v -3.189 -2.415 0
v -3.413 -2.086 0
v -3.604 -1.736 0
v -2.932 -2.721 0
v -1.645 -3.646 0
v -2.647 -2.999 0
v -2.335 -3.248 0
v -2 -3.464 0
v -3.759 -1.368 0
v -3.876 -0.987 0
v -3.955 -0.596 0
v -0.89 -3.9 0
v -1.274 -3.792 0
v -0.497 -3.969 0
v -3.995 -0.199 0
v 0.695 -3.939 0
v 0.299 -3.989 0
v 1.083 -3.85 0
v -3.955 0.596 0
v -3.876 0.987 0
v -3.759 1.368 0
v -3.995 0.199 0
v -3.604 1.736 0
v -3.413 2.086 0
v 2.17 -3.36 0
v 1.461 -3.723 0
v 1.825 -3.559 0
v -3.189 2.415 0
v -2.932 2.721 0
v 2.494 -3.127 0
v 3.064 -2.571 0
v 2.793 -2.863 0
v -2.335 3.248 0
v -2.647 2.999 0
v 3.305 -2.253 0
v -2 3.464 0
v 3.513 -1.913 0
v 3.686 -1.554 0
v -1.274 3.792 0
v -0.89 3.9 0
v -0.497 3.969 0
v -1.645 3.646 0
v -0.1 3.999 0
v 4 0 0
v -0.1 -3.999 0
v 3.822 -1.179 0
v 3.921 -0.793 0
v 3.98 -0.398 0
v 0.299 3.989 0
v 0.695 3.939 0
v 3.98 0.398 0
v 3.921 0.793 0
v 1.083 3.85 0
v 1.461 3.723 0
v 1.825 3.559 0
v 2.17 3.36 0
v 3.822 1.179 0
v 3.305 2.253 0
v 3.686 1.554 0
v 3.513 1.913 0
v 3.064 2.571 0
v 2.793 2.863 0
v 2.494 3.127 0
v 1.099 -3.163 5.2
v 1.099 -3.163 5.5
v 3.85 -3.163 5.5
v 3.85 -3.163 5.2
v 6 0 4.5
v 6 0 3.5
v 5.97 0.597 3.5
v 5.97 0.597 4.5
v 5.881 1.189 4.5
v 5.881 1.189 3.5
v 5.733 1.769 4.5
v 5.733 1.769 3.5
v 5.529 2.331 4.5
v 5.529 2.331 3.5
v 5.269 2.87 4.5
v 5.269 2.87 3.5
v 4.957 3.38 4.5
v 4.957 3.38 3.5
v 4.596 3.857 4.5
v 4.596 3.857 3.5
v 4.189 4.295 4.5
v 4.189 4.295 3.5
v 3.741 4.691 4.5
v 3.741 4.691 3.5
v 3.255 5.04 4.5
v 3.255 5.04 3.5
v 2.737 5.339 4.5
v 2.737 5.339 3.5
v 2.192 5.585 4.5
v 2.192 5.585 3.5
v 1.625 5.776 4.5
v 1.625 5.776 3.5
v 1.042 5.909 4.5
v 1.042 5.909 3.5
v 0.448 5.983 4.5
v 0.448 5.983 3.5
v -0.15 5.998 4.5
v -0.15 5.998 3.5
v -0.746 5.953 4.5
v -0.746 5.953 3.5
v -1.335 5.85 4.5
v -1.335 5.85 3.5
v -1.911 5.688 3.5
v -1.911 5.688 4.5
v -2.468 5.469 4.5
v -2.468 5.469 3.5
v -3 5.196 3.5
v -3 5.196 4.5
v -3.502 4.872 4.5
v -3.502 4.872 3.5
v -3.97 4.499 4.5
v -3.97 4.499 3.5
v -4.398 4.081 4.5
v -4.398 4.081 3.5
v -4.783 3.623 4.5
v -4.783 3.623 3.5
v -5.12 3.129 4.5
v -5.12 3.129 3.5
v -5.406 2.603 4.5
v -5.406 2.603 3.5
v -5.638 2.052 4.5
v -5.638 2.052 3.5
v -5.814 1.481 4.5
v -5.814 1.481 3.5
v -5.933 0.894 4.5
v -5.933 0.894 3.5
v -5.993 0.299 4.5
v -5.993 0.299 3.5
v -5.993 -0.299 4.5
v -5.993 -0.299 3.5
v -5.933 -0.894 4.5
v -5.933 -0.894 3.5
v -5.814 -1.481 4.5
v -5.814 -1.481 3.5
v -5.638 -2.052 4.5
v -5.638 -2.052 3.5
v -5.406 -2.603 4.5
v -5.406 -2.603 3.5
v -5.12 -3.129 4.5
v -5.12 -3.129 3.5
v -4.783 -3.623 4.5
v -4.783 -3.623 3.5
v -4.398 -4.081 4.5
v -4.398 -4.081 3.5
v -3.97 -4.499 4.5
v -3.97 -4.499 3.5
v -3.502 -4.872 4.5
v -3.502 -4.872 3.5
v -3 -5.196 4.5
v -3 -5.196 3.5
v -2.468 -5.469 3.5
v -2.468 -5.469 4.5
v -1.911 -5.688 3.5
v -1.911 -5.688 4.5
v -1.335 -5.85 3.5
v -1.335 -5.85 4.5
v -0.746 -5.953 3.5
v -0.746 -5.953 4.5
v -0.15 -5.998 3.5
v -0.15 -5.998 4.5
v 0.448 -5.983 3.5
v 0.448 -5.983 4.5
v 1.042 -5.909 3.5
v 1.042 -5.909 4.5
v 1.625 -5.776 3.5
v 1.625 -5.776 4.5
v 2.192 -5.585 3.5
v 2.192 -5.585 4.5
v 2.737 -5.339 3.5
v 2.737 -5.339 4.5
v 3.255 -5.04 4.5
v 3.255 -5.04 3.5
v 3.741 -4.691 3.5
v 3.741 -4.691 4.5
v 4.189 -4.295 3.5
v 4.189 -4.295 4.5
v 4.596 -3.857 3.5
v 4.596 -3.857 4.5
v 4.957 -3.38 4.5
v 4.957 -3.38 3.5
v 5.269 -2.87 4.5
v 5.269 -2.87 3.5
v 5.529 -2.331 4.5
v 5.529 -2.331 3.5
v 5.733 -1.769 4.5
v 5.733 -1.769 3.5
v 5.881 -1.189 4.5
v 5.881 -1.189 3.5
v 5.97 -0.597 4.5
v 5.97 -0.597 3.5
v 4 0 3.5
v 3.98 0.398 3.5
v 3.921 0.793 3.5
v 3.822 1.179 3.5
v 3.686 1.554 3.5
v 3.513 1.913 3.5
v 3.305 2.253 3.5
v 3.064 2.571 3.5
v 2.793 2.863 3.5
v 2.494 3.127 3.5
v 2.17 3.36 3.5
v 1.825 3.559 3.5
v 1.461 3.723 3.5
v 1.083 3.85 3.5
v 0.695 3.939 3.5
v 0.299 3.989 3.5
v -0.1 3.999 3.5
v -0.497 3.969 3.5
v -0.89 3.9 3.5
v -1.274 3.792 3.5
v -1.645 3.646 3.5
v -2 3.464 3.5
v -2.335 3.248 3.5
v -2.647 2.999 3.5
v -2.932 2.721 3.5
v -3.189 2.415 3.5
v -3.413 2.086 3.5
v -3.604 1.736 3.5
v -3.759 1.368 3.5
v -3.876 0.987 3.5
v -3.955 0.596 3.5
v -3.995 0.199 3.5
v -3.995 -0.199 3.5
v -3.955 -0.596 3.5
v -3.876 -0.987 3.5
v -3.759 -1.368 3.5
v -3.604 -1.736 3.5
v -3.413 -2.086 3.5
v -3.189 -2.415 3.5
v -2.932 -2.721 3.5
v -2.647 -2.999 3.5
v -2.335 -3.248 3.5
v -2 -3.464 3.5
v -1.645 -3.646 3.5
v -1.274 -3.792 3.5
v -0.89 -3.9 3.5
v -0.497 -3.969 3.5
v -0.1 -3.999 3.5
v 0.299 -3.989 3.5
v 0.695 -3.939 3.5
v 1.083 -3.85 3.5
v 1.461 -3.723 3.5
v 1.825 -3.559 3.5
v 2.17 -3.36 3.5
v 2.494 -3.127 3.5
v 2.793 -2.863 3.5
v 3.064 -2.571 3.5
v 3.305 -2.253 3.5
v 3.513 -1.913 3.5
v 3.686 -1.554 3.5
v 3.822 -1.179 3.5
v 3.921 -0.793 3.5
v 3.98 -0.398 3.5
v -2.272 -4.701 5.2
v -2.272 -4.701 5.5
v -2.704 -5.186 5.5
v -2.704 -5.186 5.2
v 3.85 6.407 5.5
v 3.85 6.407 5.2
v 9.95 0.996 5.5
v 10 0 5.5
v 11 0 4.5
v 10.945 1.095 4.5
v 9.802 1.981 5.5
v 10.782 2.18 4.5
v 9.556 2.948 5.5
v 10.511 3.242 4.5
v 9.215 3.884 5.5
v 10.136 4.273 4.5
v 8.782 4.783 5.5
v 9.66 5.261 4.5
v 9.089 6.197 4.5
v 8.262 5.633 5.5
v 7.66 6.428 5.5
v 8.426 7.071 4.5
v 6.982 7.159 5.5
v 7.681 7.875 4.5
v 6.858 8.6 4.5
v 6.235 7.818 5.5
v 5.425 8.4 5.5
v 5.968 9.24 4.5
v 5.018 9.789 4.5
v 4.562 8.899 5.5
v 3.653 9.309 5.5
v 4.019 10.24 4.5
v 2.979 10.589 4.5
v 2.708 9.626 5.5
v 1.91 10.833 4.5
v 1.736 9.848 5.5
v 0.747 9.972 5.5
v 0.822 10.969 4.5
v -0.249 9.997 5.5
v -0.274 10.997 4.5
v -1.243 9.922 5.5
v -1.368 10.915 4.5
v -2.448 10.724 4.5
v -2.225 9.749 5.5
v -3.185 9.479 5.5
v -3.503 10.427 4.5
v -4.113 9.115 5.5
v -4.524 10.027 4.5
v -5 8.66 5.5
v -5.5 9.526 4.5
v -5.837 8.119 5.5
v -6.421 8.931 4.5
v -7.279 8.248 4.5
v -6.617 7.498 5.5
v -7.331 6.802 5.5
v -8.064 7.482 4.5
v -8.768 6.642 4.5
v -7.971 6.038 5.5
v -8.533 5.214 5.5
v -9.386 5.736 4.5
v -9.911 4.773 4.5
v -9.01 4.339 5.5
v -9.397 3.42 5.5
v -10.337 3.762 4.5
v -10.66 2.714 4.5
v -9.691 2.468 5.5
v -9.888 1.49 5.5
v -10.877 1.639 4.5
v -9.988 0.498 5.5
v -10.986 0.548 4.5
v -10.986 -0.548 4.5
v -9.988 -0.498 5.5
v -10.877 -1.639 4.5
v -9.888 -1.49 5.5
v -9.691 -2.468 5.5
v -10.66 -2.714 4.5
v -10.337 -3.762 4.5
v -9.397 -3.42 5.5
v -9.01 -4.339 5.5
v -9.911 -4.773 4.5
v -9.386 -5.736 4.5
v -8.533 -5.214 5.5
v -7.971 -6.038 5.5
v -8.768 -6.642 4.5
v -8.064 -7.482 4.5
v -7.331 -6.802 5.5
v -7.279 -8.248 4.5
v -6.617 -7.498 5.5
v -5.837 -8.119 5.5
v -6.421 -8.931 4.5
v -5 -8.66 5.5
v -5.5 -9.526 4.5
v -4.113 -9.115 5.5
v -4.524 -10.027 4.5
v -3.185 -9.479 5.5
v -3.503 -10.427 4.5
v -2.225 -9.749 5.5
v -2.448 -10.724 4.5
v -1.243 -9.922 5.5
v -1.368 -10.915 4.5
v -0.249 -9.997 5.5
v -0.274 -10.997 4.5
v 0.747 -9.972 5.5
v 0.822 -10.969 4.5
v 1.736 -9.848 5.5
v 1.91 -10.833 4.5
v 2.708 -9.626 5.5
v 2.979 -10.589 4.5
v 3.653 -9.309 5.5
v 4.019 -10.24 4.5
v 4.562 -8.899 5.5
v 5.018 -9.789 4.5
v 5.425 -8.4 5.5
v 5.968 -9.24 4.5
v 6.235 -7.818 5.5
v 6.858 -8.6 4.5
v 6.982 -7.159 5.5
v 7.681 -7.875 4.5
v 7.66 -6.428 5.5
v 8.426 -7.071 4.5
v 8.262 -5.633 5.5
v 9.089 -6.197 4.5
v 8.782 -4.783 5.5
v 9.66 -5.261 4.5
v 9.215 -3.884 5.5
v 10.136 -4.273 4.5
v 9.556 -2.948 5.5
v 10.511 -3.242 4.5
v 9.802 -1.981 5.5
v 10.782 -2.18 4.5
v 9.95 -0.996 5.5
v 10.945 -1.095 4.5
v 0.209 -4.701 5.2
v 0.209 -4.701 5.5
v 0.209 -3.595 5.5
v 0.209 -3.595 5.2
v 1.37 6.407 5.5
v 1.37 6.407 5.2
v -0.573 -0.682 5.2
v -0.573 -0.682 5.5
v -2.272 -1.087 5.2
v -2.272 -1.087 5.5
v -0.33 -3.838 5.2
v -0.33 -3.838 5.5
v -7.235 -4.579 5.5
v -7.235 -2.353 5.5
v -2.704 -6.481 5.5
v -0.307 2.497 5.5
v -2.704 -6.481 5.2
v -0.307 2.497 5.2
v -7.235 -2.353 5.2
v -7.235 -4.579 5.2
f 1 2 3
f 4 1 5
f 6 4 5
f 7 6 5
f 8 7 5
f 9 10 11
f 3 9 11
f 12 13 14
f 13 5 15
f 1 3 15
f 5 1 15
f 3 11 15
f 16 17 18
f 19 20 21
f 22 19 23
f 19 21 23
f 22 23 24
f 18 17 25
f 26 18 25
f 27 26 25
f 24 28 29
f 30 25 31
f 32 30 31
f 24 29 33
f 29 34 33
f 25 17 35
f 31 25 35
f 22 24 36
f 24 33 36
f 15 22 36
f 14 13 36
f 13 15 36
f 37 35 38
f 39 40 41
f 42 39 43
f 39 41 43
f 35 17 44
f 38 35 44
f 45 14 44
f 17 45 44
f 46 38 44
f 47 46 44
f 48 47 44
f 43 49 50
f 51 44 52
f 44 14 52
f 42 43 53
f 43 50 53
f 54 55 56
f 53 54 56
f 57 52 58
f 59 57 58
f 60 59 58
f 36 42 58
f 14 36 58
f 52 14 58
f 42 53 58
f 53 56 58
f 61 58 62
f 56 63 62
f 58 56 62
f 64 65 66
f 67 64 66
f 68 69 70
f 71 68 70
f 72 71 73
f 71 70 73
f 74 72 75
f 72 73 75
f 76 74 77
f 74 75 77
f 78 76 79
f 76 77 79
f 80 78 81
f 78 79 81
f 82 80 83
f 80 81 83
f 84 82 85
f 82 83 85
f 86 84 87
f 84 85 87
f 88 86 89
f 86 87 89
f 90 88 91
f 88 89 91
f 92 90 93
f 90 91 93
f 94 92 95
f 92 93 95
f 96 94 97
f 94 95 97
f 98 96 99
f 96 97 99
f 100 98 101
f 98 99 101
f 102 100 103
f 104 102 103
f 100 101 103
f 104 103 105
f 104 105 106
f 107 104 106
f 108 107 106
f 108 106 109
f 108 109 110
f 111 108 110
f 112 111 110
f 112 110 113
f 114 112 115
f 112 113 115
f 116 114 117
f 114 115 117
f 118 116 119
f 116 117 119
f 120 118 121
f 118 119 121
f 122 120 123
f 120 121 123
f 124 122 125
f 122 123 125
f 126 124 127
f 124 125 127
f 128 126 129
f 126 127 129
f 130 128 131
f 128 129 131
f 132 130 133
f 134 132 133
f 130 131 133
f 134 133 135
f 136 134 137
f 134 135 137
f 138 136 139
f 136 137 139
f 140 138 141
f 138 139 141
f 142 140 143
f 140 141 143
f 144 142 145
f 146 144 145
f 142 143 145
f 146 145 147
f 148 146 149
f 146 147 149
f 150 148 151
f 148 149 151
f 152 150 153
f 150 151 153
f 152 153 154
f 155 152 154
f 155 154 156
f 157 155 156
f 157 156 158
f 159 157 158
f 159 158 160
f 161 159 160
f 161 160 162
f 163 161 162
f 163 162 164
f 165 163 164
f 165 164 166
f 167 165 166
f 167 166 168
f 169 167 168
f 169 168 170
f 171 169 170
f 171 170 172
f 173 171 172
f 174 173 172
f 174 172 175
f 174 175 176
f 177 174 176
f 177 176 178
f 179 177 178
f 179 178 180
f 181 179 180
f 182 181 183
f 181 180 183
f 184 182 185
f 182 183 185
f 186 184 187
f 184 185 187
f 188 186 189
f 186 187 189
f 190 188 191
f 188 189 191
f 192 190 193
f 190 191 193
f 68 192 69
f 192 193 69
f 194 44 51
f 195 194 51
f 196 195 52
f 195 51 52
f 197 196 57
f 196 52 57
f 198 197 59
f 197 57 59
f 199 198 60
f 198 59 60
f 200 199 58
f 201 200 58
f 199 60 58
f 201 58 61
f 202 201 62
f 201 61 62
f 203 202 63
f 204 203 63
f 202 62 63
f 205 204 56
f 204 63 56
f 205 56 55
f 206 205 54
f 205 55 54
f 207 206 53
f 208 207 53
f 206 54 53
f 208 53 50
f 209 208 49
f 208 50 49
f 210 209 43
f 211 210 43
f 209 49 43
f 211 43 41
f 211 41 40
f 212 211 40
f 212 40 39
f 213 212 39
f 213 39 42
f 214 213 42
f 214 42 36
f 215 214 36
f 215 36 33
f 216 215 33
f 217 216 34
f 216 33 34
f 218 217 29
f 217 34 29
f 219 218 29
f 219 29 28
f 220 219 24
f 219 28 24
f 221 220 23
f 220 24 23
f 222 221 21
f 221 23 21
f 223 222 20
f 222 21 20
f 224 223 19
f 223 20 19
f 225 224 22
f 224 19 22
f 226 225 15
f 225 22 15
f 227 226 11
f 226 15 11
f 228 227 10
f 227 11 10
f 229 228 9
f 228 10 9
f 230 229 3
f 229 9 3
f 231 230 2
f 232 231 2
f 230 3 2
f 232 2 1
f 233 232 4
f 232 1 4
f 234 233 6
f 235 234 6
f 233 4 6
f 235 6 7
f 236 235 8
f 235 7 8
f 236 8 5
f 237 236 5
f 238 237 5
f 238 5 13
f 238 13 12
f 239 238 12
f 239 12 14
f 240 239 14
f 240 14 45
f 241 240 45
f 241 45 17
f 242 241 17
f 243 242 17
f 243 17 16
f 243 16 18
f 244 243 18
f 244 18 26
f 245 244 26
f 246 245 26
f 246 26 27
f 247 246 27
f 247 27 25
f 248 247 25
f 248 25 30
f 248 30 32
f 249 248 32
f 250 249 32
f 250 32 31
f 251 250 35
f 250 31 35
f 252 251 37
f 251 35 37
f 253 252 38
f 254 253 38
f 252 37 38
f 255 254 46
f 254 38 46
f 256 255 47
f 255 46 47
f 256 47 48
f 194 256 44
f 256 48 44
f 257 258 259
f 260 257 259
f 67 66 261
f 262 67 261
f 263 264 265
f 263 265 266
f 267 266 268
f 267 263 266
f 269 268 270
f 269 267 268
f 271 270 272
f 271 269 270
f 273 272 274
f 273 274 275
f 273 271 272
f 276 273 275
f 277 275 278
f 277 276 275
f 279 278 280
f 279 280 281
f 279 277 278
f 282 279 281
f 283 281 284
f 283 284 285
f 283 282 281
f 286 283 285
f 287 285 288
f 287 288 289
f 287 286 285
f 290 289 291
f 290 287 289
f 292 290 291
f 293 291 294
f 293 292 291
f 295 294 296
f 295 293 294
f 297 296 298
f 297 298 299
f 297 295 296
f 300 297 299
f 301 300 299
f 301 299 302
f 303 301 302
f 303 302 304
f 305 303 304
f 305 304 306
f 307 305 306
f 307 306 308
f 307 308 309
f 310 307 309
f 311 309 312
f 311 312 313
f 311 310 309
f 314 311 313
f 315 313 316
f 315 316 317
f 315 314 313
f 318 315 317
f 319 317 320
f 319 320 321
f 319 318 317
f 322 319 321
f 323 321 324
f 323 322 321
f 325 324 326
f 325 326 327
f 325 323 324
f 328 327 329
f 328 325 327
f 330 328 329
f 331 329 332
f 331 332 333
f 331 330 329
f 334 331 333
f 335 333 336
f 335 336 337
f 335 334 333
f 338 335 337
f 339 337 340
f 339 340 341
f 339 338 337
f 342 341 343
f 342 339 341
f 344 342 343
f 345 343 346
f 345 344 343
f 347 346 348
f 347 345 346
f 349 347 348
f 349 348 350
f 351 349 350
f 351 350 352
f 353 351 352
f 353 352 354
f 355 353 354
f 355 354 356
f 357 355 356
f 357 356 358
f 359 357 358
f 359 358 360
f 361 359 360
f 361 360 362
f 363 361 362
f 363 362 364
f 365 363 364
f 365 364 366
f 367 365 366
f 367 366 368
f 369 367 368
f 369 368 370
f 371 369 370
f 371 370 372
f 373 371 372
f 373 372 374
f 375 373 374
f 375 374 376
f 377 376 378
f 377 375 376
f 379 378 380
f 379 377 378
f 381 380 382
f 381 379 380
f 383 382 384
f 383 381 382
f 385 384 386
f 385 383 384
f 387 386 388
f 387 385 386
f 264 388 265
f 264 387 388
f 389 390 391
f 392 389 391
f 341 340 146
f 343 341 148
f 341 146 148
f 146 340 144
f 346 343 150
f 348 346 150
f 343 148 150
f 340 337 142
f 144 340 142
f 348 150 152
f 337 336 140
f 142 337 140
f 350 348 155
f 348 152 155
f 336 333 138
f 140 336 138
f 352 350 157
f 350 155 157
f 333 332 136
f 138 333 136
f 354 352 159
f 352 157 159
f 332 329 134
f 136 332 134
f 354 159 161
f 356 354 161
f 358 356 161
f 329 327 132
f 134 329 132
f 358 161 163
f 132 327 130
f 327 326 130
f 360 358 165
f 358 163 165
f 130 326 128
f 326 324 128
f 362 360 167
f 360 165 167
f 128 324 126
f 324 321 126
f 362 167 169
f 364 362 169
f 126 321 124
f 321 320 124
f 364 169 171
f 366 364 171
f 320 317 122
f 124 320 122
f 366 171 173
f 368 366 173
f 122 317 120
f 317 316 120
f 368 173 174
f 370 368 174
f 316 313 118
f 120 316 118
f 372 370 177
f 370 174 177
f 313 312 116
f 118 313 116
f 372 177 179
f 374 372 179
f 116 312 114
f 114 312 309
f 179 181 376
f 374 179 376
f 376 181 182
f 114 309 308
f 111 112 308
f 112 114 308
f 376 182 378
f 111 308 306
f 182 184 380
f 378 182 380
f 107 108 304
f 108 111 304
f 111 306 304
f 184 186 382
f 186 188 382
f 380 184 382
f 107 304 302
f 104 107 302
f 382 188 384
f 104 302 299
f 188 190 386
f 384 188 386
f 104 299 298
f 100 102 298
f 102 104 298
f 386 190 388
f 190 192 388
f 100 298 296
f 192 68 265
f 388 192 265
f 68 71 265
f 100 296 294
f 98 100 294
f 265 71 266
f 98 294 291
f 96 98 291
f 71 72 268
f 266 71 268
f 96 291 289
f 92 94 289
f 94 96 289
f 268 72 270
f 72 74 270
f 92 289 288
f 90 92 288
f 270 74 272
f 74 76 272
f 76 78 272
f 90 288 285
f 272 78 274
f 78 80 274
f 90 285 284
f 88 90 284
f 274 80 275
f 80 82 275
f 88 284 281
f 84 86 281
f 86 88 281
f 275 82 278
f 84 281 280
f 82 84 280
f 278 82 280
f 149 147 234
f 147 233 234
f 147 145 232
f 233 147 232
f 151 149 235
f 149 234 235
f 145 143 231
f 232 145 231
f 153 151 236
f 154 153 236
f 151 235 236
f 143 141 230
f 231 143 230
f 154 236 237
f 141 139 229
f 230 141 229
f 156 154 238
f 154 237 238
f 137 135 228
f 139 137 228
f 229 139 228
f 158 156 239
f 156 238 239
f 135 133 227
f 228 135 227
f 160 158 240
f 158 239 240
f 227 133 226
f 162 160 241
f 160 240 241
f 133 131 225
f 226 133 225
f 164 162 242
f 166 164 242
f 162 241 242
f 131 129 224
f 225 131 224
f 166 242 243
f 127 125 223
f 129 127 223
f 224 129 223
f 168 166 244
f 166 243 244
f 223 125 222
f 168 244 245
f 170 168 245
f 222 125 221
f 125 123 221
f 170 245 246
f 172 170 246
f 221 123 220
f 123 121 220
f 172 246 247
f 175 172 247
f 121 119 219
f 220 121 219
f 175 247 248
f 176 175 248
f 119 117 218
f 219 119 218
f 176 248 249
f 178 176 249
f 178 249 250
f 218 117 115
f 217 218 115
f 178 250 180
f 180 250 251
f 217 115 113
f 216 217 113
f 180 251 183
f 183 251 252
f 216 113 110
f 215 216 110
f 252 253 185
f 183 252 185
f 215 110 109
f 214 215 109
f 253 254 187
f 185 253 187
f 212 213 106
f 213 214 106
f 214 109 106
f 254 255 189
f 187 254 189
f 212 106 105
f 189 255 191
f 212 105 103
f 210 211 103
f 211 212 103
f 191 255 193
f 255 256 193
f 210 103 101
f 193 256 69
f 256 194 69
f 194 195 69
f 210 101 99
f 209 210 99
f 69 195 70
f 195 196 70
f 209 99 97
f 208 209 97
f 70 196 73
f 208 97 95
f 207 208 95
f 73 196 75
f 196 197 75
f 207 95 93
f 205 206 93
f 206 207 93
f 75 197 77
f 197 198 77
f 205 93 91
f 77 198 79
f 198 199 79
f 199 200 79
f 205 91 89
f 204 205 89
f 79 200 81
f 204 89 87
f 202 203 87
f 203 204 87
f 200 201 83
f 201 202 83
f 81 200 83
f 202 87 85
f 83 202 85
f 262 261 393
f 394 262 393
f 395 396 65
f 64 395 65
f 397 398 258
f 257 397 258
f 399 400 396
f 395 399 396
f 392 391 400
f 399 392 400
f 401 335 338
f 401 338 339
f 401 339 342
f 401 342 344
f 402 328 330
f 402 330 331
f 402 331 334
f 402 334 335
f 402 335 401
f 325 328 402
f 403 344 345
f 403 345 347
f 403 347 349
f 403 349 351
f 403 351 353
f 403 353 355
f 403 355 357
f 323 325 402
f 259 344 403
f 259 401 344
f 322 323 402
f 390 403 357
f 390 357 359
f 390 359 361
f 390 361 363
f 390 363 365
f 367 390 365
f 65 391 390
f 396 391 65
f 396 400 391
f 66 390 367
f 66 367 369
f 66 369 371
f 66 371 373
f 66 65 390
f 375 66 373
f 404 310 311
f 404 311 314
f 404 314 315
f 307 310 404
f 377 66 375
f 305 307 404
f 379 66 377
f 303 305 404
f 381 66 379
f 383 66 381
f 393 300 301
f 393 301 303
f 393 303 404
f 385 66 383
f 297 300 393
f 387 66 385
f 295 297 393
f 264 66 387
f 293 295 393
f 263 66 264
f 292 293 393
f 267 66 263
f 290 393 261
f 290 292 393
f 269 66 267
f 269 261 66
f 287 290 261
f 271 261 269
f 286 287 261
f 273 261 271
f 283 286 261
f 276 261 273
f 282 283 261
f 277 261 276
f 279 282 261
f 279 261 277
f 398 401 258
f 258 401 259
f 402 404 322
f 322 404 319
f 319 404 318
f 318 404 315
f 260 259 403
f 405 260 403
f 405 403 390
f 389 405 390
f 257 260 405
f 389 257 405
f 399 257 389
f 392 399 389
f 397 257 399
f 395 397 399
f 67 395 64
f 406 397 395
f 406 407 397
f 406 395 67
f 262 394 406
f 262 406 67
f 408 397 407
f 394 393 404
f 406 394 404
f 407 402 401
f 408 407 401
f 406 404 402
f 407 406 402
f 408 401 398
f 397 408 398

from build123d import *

# Parameters (mm, degrees)
F0_R     = 4
F1_DEPTH = 3.5
F2_R     = 6
F3_DEPTH = 1
F4_R     = 11
F5_DEPTH = 1
F6_SIZE  = 0.99999
F8_DEPTH = 0.3


# Not quite as in the source:
# - a fillet or chamfer is up to 0.001 mm smaller than in the source, because OpenCascade refuses the exact size


with BuildPart() as f1:
    # F0 (on Top) → F1 (new body)
    with BuildSketch(Plane.XY):
        Circle(F0_R)
    extrude(amount=F1_DEPTH)

    # F2 (on face) → F3 (join)
    with BuildSketch(Plane.XY.offset(3.5)):
        Circle(F2_R)
    extrude(amount=F3_DEPTH)

    # F4 (on face) → F5 (join)
    with BuildSketch(Plane.XY.offset(4.5)):
        Circle(F4_R)
    extrude(amount=F5_DEPTH)

    # F6 (size 1 in the source; OpenCascade refuses exactly that, so slightly less here)
    f6_edges = [f1.edges().sort_by_distance(p)[0] for p in [
        (-11, 0, 5.5),
    ]]
    chamfer(f6_edges, length=F6_SIZE)

    # F7 (on face) → F8 (cut)
    with BuildSketch(Plane.XY.offset(5.5)):
        Polygon((1.3699667839, 6.4073562332), (-0.3065554774, 2.496608533), (-7.2352840317, -2.3525079081), (-7.2352840317, -4.5790599288), (-2.2722620734, -1.0865629438), (-2.2722620734, -4.7009375549), (-2.7038290382, -5.1864506813), (-2.7038290382, -6.4811520415), (0.2092490221, -4.7009375549), (0.2092490221, -3.5950467127), (-0.3302100332, -3.8378033924), (-0.57296648, -0.6819687688), (1.099356149, -3.1634797479), (2.4749761405, -3.1634797479), (3.8502510524, -3.1634797479), (3.8502510524, 4.6872763105), (3.8502510524, 6.4073562332), align=None)
    extrude(amount=-F8_DEPTH, mode=Mode.SUBTRACT)


solid = f1.part
